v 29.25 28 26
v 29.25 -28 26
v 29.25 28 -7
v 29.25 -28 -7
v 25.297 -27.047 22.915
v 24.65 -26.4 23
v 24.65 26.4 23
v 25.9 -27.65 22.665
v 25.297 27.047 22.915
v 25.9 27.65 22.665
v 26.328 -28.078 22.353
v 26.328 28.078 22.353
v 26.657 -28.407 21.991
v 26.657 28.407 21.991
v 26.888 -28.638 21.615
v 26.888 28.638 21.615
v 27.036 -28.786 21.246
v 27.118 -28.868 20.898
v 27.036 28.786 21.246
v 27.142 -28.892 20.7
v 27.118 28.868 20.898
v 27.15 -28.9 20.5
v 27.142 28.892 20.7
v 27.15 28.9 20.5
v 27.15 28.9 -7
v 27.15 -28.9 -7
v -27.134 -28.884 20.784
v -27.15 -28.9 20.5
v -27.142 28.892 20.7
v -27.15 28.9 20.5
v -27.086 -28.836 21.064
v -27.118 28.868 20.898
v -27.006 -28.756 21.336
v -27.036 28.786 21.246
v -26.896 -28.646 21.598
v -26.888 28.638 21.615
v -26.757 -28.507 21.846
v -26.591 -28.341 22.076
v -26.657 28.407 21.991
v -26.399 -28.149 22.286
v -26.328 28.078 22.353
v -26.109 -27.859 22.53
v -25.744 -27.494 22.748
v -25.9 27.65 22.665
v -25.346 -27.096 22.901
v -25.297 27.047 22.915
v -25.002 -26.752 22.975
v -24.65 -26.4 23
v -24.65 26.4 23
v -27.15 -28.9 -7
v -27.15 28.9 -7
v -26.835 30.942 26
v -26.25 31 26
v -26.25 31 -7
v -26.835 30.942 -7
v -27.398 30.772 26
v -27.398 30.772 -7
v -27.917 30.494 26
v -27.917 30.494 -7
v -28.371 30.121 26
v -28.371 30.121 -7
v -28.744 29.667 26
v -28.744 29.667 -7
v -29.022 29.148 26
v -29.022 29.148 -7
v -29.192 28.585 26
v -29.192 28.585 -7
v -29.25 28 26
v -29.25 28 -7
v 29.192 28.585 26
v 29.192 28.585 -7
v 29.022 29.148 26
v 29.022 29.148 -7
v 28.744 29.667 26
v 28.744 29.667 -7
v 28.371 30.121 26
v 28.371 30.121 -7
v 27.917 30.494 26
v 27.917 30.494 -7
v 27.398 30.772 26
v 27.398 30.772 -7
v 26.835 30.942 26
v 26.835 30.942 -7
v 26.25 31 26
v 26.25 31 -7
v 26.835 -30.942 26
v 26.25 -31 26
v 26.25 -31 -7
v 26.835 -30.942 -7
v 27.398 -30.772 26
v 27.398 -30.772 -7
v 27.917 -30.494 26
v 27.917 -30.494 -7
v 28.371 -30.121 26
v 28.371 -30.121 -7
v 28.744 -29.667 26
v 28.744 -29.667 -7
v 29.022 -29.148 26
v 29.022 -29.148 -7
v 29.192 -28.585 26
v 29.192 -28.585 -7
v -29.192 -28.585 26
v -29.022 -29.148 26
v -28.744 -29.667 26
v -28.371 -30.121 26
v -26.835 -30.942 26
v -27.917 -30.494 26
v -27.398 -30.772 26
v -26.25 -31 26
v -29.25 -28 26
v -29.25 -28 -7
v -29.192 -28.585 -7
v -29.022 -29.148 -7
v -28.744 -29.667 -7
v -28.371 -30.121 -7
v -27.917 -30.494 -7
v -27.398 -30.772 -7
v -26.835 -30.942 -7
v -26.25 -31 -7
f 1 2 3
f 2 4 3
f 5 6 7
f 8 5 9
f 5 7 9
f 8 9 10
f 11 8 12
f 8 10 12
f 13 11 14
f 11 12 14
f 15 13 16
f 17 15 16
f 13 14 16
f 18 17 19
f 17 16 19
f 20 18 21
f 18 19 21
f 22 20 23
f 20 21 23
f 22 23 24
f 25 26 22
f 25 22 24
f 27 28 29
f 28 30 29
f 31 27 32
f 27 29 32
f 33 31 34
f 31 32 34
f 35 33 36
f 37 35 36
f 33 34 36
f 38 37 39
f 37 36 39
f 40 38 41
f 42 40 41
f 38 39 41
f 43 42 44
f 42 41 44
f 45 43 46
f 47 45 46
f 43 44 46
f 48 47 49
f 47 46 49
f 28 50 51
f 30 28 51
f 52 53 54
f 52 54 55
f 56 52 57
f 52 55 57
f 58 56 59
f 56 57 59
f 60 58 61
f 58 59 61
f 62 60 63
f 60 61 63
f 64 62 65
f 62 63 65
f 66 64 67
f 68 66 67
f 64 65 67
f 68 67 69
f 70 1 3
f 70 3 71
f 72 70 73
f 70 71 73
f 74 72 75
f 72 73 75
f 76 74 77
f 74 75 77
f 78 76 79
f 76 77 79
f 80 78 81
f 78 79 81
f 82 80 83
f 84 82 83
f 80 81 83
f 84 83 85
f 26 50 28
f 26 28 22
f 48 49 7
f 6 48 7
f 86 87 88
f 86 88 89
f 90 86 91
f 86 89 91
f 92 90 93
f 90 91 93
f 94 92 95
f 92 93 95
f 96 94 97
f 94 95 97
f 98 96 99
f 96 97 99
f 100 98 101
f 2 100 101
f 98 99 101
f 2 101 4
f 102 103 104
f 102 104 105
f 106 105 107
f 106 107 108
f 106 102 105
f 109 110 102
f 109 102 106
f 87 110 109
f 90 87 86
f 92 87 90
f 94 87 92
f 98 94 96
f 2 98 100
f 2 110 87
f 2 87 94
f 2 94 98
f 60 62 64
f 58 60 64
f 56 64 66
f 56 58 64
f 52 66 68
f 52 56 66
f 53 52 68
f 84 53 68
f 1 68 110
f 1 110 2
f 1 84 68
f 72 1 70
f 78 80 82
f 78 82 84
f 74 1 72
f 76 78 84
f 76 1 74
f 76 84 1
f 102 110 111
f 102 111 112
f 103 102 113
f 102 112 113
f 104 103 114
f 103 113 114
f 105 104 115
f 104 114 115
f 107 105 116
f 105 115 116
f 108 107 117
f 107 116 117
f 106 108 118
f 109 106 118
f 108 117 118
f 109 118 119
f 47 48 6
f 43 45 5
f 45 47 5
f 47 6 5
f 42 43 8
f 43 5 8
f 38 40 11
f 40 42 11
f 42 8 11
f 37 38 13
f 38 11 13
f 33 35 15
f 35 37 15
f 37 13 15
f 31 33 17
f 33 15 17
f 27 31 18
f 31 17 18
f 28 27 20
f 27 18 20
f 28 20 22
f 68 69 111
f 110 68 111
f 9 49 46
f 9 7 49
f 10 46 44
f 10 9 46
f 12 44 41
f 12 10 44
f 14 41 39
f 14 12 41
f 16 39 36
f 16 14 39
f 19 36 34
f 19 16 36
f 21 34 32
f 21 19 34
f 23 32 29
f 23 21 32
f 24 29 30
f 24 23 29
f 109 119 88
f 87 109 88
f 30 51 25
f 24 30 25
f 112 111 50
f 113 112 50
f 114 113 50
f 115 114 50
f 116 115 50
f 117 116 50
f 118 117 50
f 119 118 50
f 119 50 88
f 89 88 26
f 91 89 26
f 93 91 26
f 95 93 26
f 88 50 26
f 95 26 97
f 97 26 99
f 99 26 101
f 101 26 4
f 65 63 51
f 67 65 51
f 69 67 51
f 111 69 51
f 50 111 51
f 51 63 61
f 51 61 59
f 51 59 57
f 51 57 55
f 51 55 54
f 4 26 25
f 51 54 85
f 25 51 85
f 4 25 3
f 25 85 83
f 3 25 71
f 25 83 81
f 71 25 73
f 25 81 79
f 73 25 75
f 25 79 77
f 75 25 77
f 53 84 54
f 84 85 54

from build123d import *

# Parameters (mm, degrees)
SKETCH_1_W      = 54.3
SKETCH_1_H      = 57.8
EXTRUDE_1_DEPTH = 30
EXTRUDE_2_DEPTH = 3
FILLET_1_R      = 2.5


with BuildPart() as part:
    # Эскиз1 → Бобышка-Вытянуть1 (new body)
    with BuildSketch(Plane.XY.offset(-7)):
        with BuildLine():
            Line((-26.25, -31), (26.25, -31))
            ThreePointArc((26.25, -31), (28.371320344, -30.121320344), (29.25, -28))
            Line((29.25, -28), (29.25, 28))
            ThreePointArc((29.25, 28), (28.371320344, 30.121320344), (26.25, 31))
            Line((26.25, 31), (-26.25, 31))
            ThreePointArc((-26.25, 31), (-28.371320344, 30.121320344), (-29.25, 28))
            Line((-29.25, 28), (-29.25, -28))
            ThreePointArc((-29.25, -28), (-28.371320344, -30.121320344), (-26.25, -31))
        make_face()
        Rectangle(SKETCH_1_W, SKETCH_1_H, mode=Mode.SUBTRACT)
    extrude(amount=EXTRUDE_1_DEPTH)

    # Эскиз2 → Бобышка-Вытянуть2 (add)
    with BuildSketch(Plane.XY.offset(23)):
        with BuildLine():
            Line((-26.25, -31), (26.25, -31))
            ThreePointArc((26.25, -31), (28.371320344, -30.121320344), (29.25, -28))
            Line((29.25, -28), (29.25, 28))
            ThreePointArc((29.25, 28), (28.371320344, 30.121320344), (26.25, 31))
            Line((26.25, 31), (-26.25, 31))
            ThreePointArc((-26.25, 31), (-28.371320344, 30.121320344), (-29.25, 28))
            Line((-29.25, 28), (-29.25, -28))
            ThreePointArc((-29.25, -28), (-28.371320344, -30.121320344), (-26.25, -31))
        make_face()
    extrude(amount=EXTRUDE_2_DEPTH)

    # Скругление1
    fillet_1_edges = [part.edges().sort_by_distance(p)[0] for p in [
        (0, 28.9, 23),
        (-27.15, 0, 23),
        (0, -28.9, 23),
        (27.15, 0, 23),
    ]]
    fillet(fillet_1_edges, radius=FILLET_1_R)


solid = part.part
